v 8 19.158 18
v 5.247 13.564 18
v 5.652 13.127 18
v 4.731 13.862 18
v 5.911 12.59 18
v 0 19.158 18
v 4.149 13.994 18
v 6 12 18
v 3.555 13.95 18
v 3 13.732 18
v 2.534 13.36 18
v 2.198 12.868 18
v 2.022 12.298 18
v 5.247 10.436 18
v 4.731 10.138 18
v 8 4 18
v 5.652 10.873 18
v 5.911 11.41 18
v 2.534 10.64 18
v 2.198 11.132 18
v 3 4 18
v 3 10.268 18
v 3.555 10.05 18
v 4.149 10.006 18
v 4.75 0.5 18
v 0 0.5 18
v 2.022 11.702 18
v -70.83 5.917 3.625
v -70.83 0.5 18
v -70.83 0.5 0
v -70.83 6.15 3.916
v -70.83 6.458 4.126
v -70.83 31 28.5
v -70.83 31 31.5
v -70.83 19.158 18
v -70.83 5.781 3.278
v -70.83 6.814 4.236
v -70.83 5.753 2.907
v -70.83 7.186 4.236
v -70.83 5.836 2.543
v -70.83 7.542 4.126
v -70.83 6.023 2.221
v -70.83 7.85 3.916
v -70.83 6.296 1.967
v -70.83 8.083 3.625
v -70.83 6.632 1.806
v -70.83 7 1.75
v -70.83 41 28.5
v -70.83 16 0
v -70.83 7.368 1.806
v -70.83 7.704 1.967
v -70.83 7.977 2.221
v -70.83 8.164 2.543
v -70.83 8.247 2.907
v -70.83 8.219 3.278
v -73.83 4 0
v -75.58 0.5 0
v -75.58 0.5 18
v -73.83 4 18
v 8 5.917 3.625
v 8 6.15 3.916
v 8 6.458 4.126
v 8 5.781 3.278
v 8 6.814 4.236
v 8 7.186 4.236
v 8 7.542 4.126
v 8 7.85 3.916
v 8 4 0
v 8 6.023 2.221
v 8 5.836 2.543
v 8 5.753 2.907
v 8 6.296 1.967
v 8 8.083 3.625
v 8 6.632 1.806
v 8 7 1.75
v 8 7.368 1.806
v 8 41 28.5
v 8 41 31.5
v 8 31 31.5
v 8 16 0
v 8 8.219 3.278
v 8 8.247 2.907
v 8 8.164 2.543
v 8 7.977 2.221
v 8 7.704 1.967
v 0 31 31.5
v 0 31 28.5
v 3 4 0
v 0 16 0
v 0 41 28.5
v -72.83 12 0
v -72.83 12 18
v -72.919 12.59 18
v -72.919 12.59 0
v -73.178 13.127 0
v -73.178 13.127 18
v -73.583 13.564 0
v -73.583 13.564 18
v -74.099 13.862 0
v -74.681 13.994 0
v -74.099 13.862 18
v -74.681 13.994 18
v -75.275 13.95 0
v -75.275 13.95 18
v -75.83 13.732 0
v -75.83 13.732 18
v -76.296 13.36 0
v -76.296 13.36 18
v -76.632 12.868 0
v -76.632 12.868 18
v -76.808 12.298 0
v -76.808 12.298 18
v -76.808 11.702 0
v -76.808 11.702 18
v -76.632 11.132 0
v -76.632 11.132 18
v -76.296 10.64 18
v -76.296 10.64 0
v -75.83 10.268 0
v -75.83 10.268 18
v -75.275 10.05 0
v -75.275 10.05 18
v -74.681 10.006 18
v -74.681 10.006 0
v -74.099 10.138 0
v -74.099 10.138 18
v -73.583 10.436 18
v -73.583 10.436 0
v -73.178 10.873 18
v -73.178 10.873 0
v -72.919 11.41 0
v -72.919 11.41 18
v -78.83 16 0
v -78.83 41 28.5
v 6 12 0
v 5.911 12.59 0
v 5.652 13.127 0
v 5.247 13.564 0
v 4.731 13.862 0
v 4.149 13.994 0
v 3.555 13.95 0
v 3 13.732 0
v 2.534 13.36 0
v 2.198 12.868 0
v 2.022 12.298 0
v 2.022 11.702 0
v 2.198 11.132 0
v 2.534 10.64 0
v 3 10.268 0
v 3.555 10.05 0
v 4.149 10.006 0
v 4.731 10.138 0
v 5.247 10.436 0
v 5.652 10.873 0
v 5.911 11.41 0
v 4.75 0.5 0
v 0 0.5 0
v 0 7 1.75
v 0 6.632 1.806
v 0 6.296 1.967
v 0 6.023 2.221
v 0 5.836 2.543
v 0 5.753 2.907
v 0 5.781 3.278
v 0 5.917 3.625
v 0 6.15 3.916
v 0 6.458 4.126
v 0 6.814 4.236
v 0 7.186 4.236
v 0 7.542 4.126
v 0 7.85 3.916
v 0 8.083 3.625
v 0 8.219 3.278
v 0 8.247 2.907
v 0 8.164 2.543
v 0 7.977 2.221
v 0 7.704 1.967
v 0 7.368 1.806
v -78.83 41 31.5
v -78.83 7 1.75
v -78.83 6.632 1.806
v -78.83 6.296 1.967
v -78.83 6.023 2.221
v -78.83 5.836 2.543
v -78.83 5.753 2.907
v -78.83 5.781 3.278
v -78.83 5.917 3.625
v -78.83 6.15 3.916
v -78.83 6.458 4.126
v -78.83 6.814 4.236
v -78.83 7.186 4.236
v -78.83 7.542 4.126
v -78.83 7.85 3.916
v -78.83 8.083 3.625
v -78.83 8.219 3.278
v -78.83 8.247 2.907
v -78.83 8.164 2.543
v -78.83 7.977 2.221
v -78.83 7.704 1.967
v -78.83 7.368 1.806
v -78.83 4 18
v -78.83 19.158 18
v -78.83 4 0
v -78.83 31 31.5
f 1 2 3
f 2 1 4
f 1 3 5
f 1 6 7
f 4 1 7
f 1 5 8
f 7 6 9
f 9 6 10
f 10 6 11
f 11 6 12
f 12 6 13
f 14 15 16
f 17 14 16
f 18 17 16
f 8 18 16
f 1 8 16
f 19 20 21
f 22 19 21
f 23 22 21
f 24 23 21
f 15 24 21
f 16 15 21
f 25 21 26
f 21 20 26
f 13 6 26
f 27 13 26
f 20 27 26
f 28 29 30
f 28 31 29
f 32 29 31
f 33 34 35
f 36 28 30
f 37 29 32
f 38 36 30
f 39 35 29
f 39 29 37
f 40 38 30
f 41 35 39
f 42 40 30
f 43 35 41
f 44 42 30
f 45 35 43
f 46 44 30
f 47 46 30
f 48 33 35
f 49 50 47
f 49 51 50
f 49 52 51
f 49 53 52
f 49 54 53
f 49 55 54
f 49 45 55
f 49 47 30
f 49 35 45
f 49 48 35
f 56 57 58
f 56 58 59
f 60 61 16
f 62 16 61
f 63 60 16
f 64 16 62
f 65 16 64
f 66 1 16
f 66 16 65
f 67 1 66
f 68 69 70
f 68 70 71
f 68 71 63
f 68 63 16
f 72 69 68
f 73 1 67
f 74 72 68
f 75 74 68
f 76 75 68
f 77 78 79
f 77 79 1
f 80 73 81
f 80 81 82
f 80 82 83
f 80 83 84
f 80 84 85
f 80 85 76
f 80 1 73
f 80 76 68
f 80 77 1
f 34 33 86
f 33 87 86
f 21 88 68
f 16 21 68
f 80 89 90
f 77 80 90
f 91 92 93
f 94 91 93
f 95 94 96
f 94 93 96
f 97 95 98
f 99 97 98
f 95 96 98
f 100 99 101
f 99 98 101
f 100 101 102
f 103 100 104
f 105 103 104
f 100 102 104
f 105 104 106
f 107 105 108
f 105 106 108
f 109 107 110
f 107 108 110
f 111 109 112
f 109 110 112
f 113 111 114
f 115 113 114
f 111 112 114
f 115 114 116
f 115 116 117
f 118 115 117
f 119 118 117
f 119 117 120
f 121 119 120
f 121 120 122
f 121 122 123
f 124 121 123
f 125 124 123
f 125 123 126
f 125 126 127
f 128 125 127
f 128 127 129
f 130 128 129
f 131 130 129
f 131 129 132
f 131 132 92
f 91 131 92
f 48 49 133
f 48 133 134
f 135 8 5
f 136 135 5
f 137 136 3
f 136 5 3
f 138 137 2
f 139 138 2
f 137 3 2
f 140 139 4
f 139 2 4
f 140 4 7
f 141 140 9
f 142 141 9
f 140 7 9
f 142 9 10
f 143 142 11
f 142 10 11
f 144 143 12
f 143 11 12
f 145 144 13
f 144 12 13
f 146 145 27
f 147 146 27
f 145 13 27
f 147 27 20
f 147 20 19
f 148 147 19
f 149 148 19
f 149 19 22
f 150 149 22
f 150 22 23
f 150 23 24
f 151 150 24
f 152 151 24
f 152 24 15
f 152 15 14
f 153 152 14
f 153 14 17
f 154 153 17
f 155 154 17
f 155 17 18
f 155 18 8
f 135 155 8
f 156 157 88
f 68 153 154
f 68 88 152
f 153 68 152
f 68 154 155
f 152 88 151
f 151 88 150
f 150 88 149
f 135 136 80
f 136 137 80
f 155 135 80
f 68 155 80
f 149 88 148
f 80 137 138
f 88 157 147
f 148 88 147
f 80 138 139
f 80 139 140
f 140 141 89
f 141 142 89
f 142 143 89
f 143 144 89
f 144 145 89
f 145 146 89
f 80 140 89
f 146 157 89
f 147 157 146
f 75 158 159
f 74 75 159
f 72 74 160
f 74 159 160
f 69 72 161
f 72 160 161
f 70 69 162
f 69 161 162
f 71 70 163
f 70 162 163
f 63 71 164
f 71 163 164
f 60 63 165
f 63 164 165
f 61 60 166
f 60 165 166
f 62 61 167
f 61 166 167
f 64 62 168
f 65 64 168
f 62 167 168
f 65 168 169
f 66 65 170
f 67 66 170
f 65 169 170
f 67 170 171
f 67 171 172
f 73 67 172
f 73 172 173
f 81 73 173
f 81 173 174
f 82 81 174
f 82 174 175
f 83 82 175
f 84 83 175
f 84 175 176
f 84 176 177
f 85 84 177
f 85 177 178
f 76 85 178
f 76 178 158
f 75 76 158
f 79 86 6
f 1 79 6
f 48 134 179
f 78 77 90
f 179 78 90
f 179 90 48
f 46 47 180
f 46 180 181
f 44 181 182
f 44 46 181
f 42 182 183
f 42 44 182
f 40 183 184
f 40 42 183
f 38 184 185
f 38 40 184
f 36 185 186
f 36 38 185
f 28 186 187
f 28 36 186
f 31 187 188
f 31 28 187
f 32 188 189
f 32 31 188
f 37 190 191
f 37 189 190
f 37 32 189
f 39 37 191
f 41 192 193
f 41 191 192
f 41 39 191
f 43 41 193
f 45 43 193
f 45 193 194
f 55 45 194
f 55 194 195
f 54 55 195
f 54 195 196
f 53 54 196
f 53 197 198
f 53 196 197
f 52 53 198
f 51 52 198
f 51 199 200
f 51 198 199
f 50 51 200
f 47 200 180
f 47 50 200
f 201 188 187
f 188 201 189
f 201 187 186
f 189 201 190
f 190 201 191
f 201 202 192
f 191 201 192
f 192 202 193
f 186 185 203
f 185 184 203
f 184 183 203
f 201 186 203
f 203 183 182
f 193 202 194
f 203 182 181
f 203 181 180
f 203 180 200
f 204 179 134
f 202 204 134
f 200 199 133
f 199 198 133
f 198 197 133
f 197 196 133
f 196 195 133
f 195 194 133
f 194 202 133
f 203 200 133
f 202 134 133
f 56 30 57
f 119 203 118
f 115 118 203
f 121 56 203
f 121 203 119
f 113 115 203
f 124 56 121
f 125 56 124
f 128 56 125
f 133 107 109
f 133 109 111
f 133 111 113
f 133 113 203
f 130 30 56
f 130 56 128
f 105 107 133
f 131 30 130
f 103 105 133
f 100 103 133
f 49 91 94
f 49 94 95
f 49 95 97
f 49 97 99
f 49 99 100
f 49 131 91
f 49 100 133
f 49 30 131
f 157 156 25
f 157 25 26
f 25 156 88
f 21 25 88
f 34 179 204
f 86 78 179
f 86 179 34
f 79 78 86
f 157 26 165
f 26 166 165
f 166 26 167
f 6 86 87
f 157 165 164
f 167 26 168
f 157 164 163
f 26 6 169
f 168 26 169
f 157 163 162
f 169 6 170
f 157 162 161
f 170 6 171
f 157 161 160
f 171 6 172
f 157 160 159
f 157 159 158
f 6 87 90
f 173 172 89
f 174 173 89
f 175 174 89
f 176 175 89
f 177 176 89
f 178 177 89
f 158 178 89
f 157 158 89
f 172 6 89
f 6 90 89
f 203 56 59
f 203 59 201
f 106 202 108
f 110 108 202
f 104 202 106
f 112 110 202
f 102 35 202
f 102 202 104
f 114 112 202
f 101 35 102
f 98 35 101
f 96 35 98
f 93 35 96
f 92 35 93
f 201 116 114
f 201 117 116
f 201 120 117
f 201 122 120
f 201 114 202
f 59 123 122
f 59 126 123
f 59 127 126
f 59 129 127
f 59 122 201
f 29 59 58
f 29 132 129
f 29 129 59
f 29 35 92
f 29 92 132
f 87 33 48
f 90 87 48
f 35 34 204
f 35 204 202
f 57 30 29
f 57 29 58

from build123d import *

# Parameters (mm, degrees)
BOSS_EXTRUDE1_DEPTH   = 8
CUT_EXTRUDE2_DEPTH    = 53.318734694
M3X0_5_TAPPED_HOLE1_D = 2.5
SKETCH7_W             = 3
SKETCH7_H             = 10
BOSS_EXTRUDE2_DEPTH   = 4
SKETCH8_W             = 3
SKETCH8_H             = 10
BOSS_EXTRUDE3_DEPTH   = 66.83
SKETCH10_R            = 2
CUT_EXTRUDE3_DEPTH    = 91.659632141
SKETCH11_R            = 2
CUT_EXTRUDE4_DEPTH    = 91.659632141
SKETCH12_W            = 8
SKETCH12_H            = 0.5
CUT_EXTRUDE5_DEPTH    = 95.273108043
SKETCH13_W            = 8
SKETCH13_H            = 0.5
CUT_EXTRUDE6_DEPTH    = 95.273108043


with BuildPart() as part:
    # Sketch1 → Boss-Extrude1 (new body)
    with BuildSketch(Plane(origin=(0, 0, 0), x_dir=(0, 0, -1), z_dir=(1, 0, 0))):
        Polygon((0, 0), (0, 16), (-28.5, 41), (-31.5, 41), (-31.5, 31), (-18, 19.157894737), (-18, 0), align=None)
    boss_extrude1 = extrude(amount=BOSS_EXTRUDE1_DEPTH)

    # Sketch3 → Cut-Extrude2 (cut, through all)
    with BuildSketch(Plane(origin=(0, 0, 0), x_dir=(-1, 0, 0), z_dir=(0, 0, -1))):
        Polygon((-8, 0), (-5, 0), (-3, 4), (-8, 4), align=None)
    cut_extrude2 = extrude(amount=-CUT_EXTRUDE2_DEPTH, mode=Mode.SUBTRACT)

    # M3x0.5 Tapped Hole1 (through all)
    with Locations(Plane(origin=(8, 7, 3), x_dir=(0, 0, 1), z_dir=(1, 0, 0))):
        with Locations((0, 0)):
            m3x0_5_tapped_hole1 = Hole(M3X0_5_TAPPED_HOLE1_D / 2)

    # Sketch7 → Boss-Extrude2 (add)
    with BuildSketch(Plane.ZY):
        with Locations((30, 36)):
            Rectangle(SKETCH7_W, SKETCH7_H)
    extrude(amount=BOSS_EXTRUDE2_DEPTH)

    # Sketch8 → Boss-Extrude3 (add)
    with BuildSketch(Plane.ZY.offset(4)):
        with Locations((30, 36)):
            Rectangle(SKETCH8_W, SKETCH8_H)
    extrude(amount=BOSS_EXTRUDE3_DEPTH)

    # Mirror1: Boss-Extrude1, Cut-Extrude2, M3x0.5 Tapped Hole1 across plane
    add(boss_extrude1.mirror(Plane.ZY.offset(35.415)))
    add(cut_extrude2.mirror(Plane.ZY.offset(35.415)), mode=Mode.SUBTRACT)
    add(m3x0_5_tapped_hole1.mirror(Plane.ZY.offset(35.415)), mode=Mode.SUBTRACT)

    # Sketch10 → Cut-Extrude3 (cut, through all)
    with BuildSketch(Plane.XY.offset(18)):
        with Locations((4, 12)):
            Circle(SKETCH10_R)
    extrude(amount=-CUT_EXTRUDE3_DEPTH, mode=Mode.SUBTRACT)

    # Sketch11 → Cut-Extrude4 (cut, through all)
    with BuildSketch(Plane.XY.offset(18)):
        with Locations((-74.83, 12)):
            Circle(SKETCH11_R)
    extrude(amount=-CUT_EXTRUDE4_DEPTH, mode=Mode.SUBTRACT)

    # Sketch12 → Cut-Extrude5 (cut, through all)
    with BuildSketch(Plane(origin=(0, 0, 0), x_dir=(-1, 0, 0), z_dir=(0, 0, -1))):
        with Locations((-4, 0.25)):
            Rectangle(SKETCH12_W, SKETCH12_H)
    extrude(amount=-CUT_EXTRUDE5_DEPTH, mode=Mode.SUBTRACT)

    # Sketch13 → Cut-Extrude6 (cut, through all)
    with BuildSketch(Plane(origin=(0, 0, 0), x_dir=(-1, 0, 0), z_dir=(0, 0, -1))):
        with Locations((74.83, 0.25)):
            Rectangle(SKETCH13_W, SKETCH13_H)
    extrude(amount=-CUT_EXTRUDE6_DEPTH, mode=Mode.SUBTRACT)


solid = part.part
